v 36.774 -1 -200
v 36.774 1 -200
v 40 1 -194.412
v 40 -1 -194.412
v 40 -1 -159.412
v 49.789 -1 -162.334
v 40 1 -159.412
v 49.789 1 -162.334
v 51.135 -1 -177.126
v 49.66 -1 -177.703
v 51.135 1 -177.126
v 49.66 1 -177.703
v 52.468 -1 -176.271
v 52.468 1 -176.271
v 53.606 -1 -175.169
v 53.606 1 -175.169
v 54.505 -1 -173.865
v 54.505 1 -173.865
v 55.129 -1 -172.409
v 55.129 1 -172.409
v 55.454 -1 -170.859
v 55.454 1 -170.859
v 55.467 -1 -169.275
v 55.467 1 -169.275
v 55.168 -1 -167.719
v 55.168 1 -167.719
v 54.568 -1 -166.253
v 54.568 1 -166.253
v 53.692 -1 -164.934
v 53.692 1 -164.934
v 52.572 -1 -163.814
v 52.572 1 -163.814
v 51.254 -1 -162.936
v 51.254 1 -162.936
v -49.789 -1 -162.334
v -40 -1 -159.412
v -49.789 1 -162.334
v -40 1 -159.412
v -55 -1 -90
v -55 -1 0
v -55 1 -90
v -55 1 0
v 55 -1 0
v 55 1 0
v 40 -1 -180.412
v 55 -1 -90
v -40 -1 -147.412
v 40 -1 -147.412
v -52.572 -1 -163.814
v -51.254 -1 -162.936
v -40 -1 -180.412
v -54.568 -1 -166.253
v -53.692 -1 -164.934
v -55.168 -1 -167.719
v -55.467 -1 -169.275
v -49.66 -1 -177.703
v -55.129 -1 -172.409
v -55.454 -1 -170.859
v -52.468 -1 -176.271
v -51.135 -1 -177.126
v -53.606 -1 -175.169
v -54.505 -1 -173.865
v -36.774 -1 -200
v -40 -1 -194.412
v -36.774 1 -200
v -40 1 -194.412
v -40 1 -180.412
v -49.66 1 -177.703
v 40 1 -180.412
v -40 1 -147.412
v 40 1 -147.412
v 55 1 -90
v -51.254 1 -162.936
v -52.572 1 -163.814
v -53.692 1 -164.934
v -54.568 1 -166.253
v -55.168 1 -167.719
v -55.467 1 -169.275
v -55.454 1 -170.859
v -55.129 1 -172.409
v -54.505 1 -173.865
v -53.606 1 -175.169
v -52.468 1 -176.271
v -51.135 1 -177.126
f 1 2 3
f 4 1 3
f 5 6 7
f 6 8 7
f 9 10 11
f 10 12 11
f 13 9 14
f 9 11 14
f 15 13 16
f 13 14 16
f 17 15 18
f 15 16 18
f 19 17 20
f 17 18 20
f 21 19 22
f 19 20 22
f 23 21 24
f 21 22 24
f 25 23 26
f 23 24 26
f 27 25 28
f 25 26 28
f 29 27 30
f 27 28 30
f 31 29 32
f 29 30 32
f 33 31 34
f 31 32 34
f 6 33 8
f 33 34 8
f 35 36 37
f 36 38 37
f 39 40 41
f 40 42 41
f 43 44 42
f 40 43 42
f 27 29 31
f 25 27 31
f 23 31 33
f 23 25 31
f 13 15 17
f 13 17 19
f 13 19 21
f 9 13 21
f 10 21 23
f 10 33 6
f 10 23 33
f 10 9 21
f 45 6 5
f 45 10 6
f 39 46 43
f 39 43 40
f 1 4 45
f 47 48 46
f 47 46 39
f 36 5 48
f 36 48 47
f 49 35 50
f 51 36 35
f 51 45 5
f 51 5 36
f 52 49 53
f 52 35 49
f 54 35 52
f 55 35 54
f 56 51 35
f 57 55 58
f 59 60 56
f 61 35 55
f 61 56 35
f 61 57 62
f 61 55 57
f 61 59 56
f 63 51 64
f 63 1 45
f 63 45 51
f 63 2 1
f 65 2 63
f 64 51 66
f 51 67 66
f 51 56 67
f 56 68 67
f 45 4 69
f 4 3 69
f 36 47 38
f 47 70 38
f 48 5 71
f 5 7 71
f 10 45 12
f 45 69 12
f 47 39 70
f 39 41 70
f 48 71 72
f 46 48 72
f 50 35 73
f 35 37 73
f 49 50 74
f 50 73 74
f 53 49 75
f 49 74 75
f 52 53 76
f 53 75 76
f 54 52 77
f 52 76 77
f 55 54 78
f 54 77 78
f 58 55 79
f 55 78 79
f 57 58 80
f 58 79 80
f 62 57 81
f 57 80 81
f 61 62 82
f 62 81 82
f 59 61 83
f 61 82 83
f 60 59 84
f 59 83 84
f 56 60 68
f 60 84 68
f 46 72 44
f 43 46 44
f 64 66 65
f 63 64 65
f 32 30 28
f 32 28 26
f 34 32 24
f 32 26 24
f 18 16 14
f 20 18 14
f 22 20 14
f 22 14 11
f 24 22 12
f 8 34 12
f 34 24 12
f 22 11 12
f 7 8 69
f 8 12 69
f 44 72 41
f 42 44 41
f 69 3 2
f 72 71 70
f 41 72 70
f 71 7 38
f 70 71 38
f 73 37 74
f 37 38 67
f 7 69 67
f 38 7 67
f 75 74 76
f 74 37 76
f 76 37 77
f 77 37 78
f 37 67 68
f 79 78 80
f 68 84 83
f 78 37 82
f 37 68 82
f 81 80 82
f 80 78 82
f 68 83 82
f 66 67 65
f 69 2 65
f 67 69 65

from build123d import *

# Parameters (mm, degrees)
EXTRUDE_1_DEPTH     = 1
SKETCH_2_W          = 89.659893576
SKETCH_2_H          = 2
CUT_EXTRUDE_1_DEPTH = 10


with BuildPart() as part:
    # 草图1 → 凸台-拉伸1 (new, symmetric)
    with BuildSketch(Plane(origin=(0, 0, 0), x_dir=(1, 0, 0), z_dir=(0, 1, 0))):
        with BuildLine():
            Line((55, 0), (-55, 0))
            Line((-55, 0), (-55, 90))
            Line((-55, 90), (-40, 147.411542732))
            Line((-40, 147.411542732), (-40, 159.411542732))
            Line((-40, 159.411542732), (-49.788880489, 162.334425912))
            ThreePointArc((-49.788880489, 162.334425912), (-55.499718249, 170.067141222), (-49.659893575, 177.70291242))
            Line((-49.659893575, 177.70291242), (-40, 180.411542732))
            Line((-40, 180.411542732), (-40, 194.411542732))
            Line((-40, 194.411542732), (-31, 210))
            Line((-31, 210), (31, 210))
            Line((31, 210), (40, 194.411542732))
            Line((40, 194.411542732), (40, 180.411542732))
            Line((40, 180.411542732), (49.659893575, 177.70291242))
            ThreePointArc((49.659893575, 177.70291242), (55.499718249, 170.067141222), (49.788880489, 162.334425912))
            Line((49.788880489, 162.334425912), (40, 159.411542732))
            Line((40, 159.411542732), (40, 147.411542732))
            Line((40, 147.411542732), (55, 90))
            Line((55, 90), (55, 0))
        make_face()
    extrude(amount=EXTRUDE_1_DEPTH, both=True)

    # 草图2 → 切除-拉伸1 (cut)
    with BuildSketch(Plane(origin=(0, 0, -210), x_dir=(-1, 0, 0), z_dir=(0, 0, -1))):
        Rectangle(SKETCH_2_W, SKETCH_2_H)
    extrude(amount=-CUT_EXTRUDE_1_DEPTH, mode=Mode.SUBTRACT)


solid = part.part
